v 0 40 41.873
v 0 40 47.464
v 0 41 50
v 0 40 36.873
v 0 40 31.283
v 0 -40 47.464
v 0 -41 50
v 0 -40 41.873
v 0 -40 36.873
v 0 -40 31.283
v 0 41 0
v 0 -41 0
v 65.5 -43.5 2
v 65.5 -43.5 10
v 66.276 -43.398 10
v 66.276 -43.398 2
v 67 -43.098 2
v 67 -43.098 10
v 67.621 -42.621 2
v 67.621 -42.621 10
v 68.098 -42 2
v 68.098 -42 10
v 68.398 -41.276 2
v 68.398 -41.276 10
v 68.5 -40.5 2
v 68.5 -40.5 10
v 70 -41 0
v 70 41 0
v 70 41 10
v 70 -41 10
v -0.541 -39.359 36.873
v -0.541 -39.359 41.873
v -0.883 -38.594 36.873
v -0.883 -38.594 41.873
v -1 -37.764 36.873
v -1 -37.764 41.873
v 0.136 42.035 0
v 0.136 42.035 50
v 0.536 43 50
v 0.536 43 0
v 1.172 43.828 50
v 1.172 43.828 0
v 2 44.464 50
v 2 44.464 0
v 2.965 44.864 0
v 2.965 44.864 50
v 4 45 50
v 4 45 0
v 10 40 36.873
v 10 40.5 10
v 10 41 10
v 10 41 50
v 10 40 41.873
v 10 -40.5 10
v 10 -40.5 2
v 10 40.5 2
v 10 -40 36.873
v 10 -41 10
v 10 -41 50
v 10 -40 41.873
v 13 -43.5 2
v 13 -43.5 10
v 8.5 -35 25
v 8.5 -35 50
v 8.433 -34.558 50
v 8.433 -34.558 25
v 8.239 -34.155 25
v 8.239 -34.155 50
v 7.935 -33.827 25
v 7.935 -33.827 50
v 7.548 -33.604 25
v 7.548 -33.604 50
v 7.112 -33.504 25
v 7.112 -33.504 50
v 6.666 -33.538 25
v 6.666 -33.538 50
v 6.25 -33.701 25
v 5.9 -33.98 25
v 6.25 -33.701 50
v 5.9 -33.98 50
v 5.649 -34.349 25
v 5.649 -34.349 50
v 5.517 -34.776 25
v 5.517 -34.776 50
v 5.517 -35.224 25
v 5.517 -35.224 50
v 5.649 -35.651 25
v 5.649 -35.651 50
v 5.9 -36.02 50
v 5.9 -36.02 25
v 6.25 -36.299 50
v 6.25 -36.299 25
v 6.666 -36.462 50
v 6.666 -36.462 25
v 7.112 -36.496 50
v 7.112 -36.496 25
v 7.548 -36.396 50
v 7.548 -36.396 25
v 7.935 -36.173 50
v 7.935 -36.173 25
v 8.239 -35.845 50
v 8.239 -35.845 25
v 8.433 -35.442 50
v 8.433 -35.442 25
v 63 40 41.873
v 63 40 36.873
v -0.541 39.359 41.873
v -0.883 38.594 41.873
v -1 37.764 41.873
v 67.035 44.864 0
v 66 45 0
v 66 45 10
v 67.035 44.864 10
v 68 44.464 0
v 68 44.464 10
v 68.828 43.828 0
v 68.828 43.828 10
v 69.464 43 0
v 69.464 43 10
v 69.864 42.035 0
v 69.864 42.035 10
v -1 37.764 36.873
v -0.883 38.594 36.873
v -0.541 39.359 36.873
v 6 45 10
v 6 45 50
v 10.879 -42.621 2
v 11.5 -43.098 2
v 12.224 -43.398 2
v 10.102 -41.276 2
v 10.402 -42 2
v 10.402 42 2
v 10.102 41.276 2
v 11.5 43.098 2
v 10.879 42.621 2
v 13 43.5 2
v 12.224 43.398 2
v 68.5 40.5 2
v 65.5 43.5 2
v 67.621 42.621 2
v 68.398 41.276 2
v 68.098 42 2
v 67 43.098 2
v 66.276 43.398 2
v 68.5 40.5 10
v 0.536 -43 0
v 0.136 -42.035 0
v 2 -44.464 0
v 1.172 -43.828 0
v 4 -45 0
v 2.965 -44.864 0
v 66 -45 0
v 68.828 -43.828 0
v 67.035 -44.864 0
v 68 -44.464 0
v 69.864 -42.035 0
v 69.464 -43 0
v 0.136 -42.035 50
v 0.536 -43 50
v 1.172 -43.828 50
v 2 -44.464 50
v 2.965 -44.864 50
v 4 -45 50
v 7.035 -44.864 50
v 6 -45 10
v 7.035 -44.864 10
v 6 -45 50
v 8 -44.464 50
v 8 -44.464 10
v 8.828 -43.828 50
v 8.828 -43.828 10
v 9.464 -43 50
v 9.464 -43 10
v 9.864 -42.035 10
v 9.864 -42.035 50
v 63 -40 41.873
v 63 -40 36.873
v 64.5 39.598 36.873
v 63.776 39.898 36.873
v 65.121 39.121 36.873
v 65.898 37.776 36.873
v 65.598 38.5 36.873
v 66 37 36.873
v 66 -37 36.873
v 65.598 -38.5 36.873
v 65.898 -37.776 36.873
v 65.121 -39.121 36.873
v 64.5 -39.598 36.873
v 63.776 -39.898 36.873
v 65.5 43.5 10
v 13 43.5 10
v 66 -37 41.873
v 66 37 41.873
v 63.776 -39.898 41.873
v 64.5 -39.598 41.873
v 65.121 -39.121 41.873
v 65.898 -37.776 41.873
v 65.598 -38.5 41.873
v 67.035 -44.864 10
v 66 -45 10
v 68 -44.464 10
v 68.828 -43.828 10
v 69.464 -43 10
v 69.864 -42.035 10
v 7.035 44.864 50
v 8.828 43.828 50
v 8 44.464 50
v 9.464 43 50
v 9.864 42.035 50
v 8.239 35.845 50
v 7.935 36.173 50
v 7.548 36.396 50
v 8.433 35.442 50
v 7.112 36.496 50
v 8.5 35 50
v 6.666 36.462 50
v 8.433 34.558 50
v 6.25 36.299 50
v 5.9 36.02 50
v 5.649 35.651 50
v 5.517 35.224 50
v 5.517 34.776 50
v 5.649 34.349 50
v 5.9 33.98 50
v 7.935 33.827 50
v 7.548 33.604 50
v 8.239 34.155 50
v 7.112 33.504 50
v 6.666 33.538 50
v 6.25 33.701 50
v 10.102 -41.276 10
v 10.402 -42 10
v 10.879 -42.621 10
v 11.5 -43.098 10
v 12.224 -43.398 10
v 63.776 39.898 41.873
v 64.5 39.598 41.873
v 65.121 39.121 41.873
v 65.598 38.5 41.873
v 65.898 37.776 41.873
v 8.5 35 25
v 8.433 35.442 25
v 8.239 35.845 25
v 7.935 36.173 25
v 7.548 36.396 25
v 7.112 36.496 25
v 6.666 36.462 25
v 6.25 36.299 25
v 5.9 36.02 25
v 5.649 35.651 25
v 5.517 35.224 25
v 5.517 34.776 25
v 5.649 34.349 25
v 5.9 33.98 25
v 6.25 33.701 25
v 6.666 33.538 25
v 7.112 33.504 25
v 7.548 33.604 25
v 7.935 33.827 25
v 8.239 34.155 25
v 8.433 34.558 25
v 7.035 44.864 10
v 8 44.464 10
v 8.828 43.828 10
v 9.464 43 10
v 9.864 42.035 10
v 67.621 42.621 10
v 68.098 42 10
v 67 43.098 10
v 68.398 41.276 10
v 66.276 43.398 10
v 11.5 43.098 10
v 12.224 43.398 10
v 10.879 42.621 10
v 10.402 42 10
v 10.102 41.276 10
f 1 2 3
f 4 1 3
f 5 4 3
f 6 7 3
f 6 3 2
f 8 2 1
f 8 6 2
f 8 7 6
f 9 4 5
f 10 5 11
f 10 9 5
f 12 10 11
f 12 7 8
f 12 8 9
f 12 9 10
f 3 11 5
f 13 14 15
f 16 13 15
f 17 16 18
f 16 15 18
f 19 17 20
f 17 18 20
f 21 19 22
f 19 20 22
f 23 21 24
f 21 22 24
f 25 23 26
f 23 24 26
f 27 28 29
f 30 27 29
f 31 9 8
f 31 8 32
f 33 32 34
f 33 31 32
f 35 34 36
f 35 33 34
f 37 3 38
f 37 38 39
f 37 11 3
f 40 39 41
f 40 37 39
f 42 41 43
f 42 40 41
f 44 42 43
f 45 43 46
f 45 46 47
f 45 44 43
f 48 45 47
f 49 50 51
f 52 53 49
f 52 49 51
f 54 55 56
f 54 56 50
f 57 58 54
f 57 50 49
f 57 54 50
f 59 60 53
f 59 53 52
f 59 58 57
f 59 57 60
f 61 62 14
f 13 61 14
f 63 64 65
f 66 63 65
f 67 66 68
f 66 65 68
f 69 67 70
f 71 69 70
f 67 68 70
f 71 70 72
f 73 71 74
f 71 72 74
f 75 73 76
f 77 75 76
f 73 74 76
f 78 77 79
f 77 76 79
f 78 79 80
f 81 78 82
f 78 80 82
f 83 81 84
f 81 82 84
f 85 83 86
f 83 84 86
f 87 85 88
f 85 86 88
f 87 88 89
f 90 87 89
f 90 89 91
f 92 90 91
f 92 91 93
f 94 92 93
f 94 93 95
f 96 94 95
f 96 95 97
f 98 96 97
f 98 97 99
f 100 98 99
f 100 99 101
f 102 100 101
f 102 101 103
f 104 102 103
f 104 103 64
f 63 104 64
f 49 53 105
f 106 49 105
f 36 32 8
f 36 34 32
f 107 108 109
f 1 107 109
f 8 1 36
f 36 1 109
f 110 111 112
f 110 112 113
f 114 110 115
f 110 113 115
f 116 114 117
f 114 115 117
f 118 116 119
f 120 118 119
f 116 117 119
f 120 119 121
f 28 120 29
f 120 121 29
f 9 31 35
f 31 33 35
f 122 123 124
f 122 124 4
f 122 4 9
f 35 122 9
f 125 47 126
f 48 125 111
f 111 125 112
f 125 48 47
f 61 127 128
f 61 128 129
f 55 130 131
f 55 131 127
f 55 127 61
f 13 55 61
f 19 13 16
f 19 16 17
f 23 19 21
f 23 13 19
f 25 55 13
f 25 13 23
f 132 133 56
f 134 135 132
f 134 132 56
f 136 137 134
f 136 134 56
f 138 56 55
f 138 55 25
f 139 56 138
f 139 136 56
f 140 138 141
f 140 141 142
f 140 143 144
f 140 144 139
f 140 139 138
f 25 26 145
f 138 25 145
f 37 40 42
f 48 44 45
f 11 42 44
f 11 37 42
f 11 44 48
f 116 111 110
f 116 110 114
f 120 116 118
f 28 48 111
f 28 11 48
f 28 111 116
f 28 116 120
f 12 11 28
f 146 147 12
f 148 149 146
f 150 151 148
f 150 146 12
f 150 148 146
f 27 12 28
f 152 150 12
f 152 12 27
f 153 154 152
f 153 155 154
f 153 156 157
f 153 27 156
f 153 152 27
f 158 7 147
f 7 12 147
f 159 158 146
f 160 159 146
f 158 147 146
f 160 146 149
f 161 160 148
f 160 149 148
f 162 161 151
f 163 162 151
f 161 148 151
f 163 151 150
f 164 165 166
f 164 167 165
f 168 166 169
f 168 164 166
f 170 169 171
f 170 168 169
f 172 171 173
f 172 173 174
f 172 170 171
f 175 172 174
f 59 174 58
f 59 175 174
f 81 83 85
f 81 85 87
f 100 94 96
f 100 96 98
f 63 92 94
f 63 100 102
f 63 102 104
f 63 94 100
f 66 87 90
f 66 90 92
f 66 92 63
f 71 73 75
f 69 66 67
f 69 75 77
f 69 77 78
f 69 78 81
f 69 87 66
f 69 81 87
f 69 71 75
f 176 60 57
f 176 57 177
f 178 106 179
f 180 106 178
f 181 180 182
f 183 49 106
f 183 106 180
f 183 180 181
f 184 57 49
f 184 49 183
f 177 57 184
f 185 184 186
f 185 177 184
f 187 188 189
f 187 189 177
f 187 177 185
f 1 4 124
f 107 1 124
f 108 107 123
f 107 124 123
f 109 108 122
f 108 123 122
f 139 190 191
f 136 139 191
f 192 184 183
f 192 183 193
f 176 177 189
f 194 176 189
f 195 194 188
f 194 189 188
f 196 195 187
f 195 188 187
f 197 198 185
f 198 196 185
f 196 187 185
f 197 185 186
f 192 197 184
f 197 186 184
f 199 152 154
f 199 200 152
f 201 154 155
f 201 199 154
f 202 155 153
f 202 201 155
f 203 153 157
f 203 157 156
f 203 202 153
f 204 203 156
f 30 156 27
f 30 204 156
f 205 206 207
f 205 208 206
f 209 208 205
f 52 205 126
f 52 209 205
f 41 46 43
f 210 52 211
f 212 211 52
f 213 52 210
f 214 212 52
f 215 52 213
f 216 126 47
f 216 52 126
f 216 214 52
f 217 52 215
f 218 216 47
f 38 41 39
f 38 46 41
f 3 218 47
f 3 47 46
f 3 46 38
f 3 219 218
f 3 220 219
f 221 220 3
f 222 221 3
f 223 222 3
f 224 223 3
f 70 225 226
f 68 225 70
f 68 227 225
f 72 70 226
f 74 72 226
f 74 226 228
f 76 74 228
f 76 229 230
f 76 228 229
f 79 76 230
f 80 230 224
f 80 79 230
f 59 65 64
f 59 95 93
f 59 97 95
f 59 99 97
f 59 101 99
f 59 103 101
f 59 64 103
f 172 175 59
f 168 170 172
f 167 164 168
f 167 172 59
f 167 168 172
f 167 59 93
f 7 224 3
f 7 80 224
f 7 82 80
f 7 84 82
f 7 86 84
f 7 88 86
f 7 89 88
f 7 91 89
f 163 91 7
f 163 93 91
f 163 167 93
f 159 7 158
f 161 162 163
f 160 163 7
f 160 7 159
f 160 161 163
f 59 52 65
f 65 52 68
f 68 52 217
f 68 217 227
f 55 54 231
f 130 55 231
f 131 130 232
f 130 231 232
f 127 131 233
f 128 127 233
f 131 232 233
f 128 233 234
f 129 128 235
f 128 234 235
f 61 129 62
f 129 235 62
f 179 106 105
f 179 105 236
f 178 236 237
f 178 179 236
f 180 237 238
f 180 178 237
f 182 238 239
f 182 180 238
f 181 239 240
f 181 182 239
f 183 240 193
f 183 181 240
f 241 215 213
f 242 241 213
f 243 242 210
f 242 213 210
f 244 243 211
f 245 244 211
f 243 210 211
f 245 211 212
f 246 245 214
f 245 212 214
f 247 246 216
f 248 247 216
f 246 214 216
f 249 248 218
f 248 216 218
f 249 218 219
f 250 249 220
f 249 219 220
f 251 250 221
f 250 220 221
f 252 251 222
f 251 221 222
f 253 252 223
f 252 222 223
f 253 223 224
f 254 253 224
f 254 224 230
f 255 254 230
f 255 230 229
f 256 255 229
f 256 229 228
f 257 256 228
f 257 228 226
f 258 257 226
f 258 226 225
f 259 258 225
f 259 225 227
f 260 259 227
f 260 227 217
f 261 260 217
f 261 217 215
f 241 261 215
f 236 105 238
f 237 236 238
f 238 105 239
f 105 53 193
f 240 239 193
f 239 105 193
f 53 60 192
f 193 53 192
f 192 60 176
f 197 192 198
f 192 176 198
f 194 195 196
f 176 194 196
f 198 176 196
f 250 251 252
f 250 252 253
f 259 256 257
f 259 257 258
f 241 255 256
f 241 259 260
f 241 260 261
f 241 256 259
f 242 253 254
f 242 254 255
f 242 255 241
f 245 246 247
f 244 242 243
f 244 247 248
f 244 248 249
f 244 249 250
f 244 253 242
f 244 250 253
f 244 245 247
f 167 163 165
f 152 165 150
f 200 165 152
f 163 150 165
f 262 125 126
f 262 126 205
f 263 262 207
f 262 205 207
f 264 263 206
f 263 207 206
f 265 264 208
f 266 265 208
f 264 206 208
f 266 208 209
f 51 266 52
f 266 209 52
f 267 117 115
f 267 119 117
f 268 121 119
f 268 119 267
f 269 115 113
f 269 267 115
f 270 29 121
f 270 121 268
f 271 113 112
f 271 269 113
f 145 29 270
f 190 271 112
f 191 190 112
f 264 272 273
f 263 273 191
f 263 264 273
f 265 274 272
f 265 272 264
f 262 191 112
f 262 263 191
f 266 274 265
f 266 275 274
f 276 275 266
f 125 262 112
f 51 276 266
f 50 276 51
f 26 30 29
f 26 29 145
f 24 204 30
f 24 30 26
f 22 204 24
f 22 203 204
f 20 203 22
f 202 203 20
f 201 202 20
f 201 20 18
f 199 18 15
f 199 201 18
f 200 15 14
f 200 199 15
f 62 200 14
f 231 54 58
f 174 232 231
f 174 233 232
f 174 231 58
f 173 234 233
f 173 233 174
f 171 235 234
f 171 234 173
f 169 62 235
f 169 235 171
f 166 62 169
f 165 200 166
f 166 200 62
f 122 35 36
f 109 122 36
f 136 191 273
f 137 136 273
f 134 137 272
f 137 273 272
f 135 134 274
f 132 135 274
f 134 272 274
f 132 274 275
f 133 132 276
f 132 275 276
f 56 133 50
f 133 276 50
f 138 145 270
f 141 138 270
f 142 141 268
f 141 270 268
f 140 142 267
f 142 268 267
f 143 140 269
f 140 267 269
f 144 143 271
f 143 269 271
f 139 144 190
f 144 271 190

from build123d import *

# Parameters (mm, degrees)
F1_DEPTH      = 45
F1_DEPTH_BACK = 45
F2_W          = 67
F2_H          = 5
F3_DEPTH      = 40
F3_DEPTH_BACK = 40
F5_R          = 1.5
F6_DEPTH      = 30
F8_DEPTH      = 8
F9_R          = 4
F10_T1_DEPTH  = 20
F10_T3_DEPTH  = 16.1803398875


# Not quite as in the source:
# - a fillet or chamfer that OpenCascade refuses, or shapes differently, is made with other operations: its cross-section is extruded or revolved along the edge and cut away or added


with BuildPart() as f1:
    # F0 (on Front) → F1 (new body, two sides)
    with BuildSketch(Plane.XZ) as f1_sk:
        Polygon((0, 50), (0, 0), (70, 0), (70, 10), (10, 10), (10, 50), align=None)
    extrude(amount=F1_DEPTH)
    extrude(f1_sk.sketch, amount=-F1_DEPTH_BACK)

    # F2 (on Front) → F3 (join, two sides)
    with BuildSketch(Plane.XZ) as f3_sk:
        with Locations((32.5, 39.3734816462)):
            Rectangle(F2_W, F2_H)
    extrude(amount=-F3_DEPTH)
    extrude(f3_sk.sketch, amount=F3_DEPTH_BACK)

    # F5 (on offset) → F6 (cut)
    with BuildSketch(Plane.XY.offset(55)):
        with Locations((7, -35)):
            Circle(F5_R)
        with Locations((7, 35)):
            Circle(F5_R)
    extrude(amount=-F6_DEPTH, mode=Mode.SUBTRACT)

    # F7 (on face) → F8 (cut)
    with BuildSketch(Plane.XY.offset(10)):
        with BuildLine():
            ThreePointArc((68.5, 40.5), (67.6213203436, 42.6213203436), (65.5, 43.5))
            Line((65.5, 43.5), (13, 43.5))
            ThreePointArc((13, 43.5), (10.8786796564, 42.6213203436), (10, 40.5))
            Line((10, 40.5), (10, -40.5))
            ThreePointArc((10, -40.5), (10.8786796564, -42.6213203436), (13, -43.5))
            Line((13, -43.5), (65.5, -43.5))
            ThreePointArc((65.5, -43.5), (67.6213203436, -42.6213203436), (68.5, -40.5))
            Line((68.5, -40.5), (68.5, 40.5))
        make_face()
    extrude(amount=-F8_DEPTH, mode=Mode.SUBTRACT)

    # F9
    f9_edges = [f1.edges().sort_by_distance(p)[0] for p in [
        (70, -45, 5),
        (70, 45, 5),
        (0, -45, 25),
        (0, 45, 25),
        (10, -45, 30),
        (10, 45, 30),
    ]]
    fillet(f9_edges, radius=F9_R)

    # F10: fillet of radius 3 on 4 edges, made by hand

    # F10_s2 → F10_t1 (cut)
    with BuildSketch(Plane.XY.offset(29.3734816462)):
        with BuildLine():
            ThreePointArc((63, -40), (65.1213203436, -39.1213203436), (66, -37))
            Line((66, -37), (66, -40))
            Line((66, -40), (63, -40))
        make_face()
        with BuildLine():
            ThreePointArc((63, 40), (65.1213203436, 39.1213203436), (66, 37))
            Line((66, 37), (66, 40))
            Line((66, 40), (63, 40))
        make_face()
    extrude(amount=F10_T1_DEPTH, mode=Mode.SUBTRACT)

    # F10_s4 → F10_t3 (cut)
    with BuildSketch(Plane.XY.offset(31.2833117024)):
        with BuildLine():
            ThreePointArc((0, 40), (-0.7386127875, 38.9886768939), (-1, 37.7639320225))
            Line((-1, 37.7639320225), (-1, 40))
            Line((-1, 40), (0, 40))
        make_face()
        with BuildLine():
            ThreePointArc((0, -40), (-0.7386127875, -38.9886768939), (-1, -37.7639320225))
            Line((-1, -37.7639320225), (-1, -40))
            Line((-1, -40), (0, -40))
        make_face()
    extrude(amount=F10_T3_DEPTH, mode=Mode.SUBTRACT)


solid = f1.part
